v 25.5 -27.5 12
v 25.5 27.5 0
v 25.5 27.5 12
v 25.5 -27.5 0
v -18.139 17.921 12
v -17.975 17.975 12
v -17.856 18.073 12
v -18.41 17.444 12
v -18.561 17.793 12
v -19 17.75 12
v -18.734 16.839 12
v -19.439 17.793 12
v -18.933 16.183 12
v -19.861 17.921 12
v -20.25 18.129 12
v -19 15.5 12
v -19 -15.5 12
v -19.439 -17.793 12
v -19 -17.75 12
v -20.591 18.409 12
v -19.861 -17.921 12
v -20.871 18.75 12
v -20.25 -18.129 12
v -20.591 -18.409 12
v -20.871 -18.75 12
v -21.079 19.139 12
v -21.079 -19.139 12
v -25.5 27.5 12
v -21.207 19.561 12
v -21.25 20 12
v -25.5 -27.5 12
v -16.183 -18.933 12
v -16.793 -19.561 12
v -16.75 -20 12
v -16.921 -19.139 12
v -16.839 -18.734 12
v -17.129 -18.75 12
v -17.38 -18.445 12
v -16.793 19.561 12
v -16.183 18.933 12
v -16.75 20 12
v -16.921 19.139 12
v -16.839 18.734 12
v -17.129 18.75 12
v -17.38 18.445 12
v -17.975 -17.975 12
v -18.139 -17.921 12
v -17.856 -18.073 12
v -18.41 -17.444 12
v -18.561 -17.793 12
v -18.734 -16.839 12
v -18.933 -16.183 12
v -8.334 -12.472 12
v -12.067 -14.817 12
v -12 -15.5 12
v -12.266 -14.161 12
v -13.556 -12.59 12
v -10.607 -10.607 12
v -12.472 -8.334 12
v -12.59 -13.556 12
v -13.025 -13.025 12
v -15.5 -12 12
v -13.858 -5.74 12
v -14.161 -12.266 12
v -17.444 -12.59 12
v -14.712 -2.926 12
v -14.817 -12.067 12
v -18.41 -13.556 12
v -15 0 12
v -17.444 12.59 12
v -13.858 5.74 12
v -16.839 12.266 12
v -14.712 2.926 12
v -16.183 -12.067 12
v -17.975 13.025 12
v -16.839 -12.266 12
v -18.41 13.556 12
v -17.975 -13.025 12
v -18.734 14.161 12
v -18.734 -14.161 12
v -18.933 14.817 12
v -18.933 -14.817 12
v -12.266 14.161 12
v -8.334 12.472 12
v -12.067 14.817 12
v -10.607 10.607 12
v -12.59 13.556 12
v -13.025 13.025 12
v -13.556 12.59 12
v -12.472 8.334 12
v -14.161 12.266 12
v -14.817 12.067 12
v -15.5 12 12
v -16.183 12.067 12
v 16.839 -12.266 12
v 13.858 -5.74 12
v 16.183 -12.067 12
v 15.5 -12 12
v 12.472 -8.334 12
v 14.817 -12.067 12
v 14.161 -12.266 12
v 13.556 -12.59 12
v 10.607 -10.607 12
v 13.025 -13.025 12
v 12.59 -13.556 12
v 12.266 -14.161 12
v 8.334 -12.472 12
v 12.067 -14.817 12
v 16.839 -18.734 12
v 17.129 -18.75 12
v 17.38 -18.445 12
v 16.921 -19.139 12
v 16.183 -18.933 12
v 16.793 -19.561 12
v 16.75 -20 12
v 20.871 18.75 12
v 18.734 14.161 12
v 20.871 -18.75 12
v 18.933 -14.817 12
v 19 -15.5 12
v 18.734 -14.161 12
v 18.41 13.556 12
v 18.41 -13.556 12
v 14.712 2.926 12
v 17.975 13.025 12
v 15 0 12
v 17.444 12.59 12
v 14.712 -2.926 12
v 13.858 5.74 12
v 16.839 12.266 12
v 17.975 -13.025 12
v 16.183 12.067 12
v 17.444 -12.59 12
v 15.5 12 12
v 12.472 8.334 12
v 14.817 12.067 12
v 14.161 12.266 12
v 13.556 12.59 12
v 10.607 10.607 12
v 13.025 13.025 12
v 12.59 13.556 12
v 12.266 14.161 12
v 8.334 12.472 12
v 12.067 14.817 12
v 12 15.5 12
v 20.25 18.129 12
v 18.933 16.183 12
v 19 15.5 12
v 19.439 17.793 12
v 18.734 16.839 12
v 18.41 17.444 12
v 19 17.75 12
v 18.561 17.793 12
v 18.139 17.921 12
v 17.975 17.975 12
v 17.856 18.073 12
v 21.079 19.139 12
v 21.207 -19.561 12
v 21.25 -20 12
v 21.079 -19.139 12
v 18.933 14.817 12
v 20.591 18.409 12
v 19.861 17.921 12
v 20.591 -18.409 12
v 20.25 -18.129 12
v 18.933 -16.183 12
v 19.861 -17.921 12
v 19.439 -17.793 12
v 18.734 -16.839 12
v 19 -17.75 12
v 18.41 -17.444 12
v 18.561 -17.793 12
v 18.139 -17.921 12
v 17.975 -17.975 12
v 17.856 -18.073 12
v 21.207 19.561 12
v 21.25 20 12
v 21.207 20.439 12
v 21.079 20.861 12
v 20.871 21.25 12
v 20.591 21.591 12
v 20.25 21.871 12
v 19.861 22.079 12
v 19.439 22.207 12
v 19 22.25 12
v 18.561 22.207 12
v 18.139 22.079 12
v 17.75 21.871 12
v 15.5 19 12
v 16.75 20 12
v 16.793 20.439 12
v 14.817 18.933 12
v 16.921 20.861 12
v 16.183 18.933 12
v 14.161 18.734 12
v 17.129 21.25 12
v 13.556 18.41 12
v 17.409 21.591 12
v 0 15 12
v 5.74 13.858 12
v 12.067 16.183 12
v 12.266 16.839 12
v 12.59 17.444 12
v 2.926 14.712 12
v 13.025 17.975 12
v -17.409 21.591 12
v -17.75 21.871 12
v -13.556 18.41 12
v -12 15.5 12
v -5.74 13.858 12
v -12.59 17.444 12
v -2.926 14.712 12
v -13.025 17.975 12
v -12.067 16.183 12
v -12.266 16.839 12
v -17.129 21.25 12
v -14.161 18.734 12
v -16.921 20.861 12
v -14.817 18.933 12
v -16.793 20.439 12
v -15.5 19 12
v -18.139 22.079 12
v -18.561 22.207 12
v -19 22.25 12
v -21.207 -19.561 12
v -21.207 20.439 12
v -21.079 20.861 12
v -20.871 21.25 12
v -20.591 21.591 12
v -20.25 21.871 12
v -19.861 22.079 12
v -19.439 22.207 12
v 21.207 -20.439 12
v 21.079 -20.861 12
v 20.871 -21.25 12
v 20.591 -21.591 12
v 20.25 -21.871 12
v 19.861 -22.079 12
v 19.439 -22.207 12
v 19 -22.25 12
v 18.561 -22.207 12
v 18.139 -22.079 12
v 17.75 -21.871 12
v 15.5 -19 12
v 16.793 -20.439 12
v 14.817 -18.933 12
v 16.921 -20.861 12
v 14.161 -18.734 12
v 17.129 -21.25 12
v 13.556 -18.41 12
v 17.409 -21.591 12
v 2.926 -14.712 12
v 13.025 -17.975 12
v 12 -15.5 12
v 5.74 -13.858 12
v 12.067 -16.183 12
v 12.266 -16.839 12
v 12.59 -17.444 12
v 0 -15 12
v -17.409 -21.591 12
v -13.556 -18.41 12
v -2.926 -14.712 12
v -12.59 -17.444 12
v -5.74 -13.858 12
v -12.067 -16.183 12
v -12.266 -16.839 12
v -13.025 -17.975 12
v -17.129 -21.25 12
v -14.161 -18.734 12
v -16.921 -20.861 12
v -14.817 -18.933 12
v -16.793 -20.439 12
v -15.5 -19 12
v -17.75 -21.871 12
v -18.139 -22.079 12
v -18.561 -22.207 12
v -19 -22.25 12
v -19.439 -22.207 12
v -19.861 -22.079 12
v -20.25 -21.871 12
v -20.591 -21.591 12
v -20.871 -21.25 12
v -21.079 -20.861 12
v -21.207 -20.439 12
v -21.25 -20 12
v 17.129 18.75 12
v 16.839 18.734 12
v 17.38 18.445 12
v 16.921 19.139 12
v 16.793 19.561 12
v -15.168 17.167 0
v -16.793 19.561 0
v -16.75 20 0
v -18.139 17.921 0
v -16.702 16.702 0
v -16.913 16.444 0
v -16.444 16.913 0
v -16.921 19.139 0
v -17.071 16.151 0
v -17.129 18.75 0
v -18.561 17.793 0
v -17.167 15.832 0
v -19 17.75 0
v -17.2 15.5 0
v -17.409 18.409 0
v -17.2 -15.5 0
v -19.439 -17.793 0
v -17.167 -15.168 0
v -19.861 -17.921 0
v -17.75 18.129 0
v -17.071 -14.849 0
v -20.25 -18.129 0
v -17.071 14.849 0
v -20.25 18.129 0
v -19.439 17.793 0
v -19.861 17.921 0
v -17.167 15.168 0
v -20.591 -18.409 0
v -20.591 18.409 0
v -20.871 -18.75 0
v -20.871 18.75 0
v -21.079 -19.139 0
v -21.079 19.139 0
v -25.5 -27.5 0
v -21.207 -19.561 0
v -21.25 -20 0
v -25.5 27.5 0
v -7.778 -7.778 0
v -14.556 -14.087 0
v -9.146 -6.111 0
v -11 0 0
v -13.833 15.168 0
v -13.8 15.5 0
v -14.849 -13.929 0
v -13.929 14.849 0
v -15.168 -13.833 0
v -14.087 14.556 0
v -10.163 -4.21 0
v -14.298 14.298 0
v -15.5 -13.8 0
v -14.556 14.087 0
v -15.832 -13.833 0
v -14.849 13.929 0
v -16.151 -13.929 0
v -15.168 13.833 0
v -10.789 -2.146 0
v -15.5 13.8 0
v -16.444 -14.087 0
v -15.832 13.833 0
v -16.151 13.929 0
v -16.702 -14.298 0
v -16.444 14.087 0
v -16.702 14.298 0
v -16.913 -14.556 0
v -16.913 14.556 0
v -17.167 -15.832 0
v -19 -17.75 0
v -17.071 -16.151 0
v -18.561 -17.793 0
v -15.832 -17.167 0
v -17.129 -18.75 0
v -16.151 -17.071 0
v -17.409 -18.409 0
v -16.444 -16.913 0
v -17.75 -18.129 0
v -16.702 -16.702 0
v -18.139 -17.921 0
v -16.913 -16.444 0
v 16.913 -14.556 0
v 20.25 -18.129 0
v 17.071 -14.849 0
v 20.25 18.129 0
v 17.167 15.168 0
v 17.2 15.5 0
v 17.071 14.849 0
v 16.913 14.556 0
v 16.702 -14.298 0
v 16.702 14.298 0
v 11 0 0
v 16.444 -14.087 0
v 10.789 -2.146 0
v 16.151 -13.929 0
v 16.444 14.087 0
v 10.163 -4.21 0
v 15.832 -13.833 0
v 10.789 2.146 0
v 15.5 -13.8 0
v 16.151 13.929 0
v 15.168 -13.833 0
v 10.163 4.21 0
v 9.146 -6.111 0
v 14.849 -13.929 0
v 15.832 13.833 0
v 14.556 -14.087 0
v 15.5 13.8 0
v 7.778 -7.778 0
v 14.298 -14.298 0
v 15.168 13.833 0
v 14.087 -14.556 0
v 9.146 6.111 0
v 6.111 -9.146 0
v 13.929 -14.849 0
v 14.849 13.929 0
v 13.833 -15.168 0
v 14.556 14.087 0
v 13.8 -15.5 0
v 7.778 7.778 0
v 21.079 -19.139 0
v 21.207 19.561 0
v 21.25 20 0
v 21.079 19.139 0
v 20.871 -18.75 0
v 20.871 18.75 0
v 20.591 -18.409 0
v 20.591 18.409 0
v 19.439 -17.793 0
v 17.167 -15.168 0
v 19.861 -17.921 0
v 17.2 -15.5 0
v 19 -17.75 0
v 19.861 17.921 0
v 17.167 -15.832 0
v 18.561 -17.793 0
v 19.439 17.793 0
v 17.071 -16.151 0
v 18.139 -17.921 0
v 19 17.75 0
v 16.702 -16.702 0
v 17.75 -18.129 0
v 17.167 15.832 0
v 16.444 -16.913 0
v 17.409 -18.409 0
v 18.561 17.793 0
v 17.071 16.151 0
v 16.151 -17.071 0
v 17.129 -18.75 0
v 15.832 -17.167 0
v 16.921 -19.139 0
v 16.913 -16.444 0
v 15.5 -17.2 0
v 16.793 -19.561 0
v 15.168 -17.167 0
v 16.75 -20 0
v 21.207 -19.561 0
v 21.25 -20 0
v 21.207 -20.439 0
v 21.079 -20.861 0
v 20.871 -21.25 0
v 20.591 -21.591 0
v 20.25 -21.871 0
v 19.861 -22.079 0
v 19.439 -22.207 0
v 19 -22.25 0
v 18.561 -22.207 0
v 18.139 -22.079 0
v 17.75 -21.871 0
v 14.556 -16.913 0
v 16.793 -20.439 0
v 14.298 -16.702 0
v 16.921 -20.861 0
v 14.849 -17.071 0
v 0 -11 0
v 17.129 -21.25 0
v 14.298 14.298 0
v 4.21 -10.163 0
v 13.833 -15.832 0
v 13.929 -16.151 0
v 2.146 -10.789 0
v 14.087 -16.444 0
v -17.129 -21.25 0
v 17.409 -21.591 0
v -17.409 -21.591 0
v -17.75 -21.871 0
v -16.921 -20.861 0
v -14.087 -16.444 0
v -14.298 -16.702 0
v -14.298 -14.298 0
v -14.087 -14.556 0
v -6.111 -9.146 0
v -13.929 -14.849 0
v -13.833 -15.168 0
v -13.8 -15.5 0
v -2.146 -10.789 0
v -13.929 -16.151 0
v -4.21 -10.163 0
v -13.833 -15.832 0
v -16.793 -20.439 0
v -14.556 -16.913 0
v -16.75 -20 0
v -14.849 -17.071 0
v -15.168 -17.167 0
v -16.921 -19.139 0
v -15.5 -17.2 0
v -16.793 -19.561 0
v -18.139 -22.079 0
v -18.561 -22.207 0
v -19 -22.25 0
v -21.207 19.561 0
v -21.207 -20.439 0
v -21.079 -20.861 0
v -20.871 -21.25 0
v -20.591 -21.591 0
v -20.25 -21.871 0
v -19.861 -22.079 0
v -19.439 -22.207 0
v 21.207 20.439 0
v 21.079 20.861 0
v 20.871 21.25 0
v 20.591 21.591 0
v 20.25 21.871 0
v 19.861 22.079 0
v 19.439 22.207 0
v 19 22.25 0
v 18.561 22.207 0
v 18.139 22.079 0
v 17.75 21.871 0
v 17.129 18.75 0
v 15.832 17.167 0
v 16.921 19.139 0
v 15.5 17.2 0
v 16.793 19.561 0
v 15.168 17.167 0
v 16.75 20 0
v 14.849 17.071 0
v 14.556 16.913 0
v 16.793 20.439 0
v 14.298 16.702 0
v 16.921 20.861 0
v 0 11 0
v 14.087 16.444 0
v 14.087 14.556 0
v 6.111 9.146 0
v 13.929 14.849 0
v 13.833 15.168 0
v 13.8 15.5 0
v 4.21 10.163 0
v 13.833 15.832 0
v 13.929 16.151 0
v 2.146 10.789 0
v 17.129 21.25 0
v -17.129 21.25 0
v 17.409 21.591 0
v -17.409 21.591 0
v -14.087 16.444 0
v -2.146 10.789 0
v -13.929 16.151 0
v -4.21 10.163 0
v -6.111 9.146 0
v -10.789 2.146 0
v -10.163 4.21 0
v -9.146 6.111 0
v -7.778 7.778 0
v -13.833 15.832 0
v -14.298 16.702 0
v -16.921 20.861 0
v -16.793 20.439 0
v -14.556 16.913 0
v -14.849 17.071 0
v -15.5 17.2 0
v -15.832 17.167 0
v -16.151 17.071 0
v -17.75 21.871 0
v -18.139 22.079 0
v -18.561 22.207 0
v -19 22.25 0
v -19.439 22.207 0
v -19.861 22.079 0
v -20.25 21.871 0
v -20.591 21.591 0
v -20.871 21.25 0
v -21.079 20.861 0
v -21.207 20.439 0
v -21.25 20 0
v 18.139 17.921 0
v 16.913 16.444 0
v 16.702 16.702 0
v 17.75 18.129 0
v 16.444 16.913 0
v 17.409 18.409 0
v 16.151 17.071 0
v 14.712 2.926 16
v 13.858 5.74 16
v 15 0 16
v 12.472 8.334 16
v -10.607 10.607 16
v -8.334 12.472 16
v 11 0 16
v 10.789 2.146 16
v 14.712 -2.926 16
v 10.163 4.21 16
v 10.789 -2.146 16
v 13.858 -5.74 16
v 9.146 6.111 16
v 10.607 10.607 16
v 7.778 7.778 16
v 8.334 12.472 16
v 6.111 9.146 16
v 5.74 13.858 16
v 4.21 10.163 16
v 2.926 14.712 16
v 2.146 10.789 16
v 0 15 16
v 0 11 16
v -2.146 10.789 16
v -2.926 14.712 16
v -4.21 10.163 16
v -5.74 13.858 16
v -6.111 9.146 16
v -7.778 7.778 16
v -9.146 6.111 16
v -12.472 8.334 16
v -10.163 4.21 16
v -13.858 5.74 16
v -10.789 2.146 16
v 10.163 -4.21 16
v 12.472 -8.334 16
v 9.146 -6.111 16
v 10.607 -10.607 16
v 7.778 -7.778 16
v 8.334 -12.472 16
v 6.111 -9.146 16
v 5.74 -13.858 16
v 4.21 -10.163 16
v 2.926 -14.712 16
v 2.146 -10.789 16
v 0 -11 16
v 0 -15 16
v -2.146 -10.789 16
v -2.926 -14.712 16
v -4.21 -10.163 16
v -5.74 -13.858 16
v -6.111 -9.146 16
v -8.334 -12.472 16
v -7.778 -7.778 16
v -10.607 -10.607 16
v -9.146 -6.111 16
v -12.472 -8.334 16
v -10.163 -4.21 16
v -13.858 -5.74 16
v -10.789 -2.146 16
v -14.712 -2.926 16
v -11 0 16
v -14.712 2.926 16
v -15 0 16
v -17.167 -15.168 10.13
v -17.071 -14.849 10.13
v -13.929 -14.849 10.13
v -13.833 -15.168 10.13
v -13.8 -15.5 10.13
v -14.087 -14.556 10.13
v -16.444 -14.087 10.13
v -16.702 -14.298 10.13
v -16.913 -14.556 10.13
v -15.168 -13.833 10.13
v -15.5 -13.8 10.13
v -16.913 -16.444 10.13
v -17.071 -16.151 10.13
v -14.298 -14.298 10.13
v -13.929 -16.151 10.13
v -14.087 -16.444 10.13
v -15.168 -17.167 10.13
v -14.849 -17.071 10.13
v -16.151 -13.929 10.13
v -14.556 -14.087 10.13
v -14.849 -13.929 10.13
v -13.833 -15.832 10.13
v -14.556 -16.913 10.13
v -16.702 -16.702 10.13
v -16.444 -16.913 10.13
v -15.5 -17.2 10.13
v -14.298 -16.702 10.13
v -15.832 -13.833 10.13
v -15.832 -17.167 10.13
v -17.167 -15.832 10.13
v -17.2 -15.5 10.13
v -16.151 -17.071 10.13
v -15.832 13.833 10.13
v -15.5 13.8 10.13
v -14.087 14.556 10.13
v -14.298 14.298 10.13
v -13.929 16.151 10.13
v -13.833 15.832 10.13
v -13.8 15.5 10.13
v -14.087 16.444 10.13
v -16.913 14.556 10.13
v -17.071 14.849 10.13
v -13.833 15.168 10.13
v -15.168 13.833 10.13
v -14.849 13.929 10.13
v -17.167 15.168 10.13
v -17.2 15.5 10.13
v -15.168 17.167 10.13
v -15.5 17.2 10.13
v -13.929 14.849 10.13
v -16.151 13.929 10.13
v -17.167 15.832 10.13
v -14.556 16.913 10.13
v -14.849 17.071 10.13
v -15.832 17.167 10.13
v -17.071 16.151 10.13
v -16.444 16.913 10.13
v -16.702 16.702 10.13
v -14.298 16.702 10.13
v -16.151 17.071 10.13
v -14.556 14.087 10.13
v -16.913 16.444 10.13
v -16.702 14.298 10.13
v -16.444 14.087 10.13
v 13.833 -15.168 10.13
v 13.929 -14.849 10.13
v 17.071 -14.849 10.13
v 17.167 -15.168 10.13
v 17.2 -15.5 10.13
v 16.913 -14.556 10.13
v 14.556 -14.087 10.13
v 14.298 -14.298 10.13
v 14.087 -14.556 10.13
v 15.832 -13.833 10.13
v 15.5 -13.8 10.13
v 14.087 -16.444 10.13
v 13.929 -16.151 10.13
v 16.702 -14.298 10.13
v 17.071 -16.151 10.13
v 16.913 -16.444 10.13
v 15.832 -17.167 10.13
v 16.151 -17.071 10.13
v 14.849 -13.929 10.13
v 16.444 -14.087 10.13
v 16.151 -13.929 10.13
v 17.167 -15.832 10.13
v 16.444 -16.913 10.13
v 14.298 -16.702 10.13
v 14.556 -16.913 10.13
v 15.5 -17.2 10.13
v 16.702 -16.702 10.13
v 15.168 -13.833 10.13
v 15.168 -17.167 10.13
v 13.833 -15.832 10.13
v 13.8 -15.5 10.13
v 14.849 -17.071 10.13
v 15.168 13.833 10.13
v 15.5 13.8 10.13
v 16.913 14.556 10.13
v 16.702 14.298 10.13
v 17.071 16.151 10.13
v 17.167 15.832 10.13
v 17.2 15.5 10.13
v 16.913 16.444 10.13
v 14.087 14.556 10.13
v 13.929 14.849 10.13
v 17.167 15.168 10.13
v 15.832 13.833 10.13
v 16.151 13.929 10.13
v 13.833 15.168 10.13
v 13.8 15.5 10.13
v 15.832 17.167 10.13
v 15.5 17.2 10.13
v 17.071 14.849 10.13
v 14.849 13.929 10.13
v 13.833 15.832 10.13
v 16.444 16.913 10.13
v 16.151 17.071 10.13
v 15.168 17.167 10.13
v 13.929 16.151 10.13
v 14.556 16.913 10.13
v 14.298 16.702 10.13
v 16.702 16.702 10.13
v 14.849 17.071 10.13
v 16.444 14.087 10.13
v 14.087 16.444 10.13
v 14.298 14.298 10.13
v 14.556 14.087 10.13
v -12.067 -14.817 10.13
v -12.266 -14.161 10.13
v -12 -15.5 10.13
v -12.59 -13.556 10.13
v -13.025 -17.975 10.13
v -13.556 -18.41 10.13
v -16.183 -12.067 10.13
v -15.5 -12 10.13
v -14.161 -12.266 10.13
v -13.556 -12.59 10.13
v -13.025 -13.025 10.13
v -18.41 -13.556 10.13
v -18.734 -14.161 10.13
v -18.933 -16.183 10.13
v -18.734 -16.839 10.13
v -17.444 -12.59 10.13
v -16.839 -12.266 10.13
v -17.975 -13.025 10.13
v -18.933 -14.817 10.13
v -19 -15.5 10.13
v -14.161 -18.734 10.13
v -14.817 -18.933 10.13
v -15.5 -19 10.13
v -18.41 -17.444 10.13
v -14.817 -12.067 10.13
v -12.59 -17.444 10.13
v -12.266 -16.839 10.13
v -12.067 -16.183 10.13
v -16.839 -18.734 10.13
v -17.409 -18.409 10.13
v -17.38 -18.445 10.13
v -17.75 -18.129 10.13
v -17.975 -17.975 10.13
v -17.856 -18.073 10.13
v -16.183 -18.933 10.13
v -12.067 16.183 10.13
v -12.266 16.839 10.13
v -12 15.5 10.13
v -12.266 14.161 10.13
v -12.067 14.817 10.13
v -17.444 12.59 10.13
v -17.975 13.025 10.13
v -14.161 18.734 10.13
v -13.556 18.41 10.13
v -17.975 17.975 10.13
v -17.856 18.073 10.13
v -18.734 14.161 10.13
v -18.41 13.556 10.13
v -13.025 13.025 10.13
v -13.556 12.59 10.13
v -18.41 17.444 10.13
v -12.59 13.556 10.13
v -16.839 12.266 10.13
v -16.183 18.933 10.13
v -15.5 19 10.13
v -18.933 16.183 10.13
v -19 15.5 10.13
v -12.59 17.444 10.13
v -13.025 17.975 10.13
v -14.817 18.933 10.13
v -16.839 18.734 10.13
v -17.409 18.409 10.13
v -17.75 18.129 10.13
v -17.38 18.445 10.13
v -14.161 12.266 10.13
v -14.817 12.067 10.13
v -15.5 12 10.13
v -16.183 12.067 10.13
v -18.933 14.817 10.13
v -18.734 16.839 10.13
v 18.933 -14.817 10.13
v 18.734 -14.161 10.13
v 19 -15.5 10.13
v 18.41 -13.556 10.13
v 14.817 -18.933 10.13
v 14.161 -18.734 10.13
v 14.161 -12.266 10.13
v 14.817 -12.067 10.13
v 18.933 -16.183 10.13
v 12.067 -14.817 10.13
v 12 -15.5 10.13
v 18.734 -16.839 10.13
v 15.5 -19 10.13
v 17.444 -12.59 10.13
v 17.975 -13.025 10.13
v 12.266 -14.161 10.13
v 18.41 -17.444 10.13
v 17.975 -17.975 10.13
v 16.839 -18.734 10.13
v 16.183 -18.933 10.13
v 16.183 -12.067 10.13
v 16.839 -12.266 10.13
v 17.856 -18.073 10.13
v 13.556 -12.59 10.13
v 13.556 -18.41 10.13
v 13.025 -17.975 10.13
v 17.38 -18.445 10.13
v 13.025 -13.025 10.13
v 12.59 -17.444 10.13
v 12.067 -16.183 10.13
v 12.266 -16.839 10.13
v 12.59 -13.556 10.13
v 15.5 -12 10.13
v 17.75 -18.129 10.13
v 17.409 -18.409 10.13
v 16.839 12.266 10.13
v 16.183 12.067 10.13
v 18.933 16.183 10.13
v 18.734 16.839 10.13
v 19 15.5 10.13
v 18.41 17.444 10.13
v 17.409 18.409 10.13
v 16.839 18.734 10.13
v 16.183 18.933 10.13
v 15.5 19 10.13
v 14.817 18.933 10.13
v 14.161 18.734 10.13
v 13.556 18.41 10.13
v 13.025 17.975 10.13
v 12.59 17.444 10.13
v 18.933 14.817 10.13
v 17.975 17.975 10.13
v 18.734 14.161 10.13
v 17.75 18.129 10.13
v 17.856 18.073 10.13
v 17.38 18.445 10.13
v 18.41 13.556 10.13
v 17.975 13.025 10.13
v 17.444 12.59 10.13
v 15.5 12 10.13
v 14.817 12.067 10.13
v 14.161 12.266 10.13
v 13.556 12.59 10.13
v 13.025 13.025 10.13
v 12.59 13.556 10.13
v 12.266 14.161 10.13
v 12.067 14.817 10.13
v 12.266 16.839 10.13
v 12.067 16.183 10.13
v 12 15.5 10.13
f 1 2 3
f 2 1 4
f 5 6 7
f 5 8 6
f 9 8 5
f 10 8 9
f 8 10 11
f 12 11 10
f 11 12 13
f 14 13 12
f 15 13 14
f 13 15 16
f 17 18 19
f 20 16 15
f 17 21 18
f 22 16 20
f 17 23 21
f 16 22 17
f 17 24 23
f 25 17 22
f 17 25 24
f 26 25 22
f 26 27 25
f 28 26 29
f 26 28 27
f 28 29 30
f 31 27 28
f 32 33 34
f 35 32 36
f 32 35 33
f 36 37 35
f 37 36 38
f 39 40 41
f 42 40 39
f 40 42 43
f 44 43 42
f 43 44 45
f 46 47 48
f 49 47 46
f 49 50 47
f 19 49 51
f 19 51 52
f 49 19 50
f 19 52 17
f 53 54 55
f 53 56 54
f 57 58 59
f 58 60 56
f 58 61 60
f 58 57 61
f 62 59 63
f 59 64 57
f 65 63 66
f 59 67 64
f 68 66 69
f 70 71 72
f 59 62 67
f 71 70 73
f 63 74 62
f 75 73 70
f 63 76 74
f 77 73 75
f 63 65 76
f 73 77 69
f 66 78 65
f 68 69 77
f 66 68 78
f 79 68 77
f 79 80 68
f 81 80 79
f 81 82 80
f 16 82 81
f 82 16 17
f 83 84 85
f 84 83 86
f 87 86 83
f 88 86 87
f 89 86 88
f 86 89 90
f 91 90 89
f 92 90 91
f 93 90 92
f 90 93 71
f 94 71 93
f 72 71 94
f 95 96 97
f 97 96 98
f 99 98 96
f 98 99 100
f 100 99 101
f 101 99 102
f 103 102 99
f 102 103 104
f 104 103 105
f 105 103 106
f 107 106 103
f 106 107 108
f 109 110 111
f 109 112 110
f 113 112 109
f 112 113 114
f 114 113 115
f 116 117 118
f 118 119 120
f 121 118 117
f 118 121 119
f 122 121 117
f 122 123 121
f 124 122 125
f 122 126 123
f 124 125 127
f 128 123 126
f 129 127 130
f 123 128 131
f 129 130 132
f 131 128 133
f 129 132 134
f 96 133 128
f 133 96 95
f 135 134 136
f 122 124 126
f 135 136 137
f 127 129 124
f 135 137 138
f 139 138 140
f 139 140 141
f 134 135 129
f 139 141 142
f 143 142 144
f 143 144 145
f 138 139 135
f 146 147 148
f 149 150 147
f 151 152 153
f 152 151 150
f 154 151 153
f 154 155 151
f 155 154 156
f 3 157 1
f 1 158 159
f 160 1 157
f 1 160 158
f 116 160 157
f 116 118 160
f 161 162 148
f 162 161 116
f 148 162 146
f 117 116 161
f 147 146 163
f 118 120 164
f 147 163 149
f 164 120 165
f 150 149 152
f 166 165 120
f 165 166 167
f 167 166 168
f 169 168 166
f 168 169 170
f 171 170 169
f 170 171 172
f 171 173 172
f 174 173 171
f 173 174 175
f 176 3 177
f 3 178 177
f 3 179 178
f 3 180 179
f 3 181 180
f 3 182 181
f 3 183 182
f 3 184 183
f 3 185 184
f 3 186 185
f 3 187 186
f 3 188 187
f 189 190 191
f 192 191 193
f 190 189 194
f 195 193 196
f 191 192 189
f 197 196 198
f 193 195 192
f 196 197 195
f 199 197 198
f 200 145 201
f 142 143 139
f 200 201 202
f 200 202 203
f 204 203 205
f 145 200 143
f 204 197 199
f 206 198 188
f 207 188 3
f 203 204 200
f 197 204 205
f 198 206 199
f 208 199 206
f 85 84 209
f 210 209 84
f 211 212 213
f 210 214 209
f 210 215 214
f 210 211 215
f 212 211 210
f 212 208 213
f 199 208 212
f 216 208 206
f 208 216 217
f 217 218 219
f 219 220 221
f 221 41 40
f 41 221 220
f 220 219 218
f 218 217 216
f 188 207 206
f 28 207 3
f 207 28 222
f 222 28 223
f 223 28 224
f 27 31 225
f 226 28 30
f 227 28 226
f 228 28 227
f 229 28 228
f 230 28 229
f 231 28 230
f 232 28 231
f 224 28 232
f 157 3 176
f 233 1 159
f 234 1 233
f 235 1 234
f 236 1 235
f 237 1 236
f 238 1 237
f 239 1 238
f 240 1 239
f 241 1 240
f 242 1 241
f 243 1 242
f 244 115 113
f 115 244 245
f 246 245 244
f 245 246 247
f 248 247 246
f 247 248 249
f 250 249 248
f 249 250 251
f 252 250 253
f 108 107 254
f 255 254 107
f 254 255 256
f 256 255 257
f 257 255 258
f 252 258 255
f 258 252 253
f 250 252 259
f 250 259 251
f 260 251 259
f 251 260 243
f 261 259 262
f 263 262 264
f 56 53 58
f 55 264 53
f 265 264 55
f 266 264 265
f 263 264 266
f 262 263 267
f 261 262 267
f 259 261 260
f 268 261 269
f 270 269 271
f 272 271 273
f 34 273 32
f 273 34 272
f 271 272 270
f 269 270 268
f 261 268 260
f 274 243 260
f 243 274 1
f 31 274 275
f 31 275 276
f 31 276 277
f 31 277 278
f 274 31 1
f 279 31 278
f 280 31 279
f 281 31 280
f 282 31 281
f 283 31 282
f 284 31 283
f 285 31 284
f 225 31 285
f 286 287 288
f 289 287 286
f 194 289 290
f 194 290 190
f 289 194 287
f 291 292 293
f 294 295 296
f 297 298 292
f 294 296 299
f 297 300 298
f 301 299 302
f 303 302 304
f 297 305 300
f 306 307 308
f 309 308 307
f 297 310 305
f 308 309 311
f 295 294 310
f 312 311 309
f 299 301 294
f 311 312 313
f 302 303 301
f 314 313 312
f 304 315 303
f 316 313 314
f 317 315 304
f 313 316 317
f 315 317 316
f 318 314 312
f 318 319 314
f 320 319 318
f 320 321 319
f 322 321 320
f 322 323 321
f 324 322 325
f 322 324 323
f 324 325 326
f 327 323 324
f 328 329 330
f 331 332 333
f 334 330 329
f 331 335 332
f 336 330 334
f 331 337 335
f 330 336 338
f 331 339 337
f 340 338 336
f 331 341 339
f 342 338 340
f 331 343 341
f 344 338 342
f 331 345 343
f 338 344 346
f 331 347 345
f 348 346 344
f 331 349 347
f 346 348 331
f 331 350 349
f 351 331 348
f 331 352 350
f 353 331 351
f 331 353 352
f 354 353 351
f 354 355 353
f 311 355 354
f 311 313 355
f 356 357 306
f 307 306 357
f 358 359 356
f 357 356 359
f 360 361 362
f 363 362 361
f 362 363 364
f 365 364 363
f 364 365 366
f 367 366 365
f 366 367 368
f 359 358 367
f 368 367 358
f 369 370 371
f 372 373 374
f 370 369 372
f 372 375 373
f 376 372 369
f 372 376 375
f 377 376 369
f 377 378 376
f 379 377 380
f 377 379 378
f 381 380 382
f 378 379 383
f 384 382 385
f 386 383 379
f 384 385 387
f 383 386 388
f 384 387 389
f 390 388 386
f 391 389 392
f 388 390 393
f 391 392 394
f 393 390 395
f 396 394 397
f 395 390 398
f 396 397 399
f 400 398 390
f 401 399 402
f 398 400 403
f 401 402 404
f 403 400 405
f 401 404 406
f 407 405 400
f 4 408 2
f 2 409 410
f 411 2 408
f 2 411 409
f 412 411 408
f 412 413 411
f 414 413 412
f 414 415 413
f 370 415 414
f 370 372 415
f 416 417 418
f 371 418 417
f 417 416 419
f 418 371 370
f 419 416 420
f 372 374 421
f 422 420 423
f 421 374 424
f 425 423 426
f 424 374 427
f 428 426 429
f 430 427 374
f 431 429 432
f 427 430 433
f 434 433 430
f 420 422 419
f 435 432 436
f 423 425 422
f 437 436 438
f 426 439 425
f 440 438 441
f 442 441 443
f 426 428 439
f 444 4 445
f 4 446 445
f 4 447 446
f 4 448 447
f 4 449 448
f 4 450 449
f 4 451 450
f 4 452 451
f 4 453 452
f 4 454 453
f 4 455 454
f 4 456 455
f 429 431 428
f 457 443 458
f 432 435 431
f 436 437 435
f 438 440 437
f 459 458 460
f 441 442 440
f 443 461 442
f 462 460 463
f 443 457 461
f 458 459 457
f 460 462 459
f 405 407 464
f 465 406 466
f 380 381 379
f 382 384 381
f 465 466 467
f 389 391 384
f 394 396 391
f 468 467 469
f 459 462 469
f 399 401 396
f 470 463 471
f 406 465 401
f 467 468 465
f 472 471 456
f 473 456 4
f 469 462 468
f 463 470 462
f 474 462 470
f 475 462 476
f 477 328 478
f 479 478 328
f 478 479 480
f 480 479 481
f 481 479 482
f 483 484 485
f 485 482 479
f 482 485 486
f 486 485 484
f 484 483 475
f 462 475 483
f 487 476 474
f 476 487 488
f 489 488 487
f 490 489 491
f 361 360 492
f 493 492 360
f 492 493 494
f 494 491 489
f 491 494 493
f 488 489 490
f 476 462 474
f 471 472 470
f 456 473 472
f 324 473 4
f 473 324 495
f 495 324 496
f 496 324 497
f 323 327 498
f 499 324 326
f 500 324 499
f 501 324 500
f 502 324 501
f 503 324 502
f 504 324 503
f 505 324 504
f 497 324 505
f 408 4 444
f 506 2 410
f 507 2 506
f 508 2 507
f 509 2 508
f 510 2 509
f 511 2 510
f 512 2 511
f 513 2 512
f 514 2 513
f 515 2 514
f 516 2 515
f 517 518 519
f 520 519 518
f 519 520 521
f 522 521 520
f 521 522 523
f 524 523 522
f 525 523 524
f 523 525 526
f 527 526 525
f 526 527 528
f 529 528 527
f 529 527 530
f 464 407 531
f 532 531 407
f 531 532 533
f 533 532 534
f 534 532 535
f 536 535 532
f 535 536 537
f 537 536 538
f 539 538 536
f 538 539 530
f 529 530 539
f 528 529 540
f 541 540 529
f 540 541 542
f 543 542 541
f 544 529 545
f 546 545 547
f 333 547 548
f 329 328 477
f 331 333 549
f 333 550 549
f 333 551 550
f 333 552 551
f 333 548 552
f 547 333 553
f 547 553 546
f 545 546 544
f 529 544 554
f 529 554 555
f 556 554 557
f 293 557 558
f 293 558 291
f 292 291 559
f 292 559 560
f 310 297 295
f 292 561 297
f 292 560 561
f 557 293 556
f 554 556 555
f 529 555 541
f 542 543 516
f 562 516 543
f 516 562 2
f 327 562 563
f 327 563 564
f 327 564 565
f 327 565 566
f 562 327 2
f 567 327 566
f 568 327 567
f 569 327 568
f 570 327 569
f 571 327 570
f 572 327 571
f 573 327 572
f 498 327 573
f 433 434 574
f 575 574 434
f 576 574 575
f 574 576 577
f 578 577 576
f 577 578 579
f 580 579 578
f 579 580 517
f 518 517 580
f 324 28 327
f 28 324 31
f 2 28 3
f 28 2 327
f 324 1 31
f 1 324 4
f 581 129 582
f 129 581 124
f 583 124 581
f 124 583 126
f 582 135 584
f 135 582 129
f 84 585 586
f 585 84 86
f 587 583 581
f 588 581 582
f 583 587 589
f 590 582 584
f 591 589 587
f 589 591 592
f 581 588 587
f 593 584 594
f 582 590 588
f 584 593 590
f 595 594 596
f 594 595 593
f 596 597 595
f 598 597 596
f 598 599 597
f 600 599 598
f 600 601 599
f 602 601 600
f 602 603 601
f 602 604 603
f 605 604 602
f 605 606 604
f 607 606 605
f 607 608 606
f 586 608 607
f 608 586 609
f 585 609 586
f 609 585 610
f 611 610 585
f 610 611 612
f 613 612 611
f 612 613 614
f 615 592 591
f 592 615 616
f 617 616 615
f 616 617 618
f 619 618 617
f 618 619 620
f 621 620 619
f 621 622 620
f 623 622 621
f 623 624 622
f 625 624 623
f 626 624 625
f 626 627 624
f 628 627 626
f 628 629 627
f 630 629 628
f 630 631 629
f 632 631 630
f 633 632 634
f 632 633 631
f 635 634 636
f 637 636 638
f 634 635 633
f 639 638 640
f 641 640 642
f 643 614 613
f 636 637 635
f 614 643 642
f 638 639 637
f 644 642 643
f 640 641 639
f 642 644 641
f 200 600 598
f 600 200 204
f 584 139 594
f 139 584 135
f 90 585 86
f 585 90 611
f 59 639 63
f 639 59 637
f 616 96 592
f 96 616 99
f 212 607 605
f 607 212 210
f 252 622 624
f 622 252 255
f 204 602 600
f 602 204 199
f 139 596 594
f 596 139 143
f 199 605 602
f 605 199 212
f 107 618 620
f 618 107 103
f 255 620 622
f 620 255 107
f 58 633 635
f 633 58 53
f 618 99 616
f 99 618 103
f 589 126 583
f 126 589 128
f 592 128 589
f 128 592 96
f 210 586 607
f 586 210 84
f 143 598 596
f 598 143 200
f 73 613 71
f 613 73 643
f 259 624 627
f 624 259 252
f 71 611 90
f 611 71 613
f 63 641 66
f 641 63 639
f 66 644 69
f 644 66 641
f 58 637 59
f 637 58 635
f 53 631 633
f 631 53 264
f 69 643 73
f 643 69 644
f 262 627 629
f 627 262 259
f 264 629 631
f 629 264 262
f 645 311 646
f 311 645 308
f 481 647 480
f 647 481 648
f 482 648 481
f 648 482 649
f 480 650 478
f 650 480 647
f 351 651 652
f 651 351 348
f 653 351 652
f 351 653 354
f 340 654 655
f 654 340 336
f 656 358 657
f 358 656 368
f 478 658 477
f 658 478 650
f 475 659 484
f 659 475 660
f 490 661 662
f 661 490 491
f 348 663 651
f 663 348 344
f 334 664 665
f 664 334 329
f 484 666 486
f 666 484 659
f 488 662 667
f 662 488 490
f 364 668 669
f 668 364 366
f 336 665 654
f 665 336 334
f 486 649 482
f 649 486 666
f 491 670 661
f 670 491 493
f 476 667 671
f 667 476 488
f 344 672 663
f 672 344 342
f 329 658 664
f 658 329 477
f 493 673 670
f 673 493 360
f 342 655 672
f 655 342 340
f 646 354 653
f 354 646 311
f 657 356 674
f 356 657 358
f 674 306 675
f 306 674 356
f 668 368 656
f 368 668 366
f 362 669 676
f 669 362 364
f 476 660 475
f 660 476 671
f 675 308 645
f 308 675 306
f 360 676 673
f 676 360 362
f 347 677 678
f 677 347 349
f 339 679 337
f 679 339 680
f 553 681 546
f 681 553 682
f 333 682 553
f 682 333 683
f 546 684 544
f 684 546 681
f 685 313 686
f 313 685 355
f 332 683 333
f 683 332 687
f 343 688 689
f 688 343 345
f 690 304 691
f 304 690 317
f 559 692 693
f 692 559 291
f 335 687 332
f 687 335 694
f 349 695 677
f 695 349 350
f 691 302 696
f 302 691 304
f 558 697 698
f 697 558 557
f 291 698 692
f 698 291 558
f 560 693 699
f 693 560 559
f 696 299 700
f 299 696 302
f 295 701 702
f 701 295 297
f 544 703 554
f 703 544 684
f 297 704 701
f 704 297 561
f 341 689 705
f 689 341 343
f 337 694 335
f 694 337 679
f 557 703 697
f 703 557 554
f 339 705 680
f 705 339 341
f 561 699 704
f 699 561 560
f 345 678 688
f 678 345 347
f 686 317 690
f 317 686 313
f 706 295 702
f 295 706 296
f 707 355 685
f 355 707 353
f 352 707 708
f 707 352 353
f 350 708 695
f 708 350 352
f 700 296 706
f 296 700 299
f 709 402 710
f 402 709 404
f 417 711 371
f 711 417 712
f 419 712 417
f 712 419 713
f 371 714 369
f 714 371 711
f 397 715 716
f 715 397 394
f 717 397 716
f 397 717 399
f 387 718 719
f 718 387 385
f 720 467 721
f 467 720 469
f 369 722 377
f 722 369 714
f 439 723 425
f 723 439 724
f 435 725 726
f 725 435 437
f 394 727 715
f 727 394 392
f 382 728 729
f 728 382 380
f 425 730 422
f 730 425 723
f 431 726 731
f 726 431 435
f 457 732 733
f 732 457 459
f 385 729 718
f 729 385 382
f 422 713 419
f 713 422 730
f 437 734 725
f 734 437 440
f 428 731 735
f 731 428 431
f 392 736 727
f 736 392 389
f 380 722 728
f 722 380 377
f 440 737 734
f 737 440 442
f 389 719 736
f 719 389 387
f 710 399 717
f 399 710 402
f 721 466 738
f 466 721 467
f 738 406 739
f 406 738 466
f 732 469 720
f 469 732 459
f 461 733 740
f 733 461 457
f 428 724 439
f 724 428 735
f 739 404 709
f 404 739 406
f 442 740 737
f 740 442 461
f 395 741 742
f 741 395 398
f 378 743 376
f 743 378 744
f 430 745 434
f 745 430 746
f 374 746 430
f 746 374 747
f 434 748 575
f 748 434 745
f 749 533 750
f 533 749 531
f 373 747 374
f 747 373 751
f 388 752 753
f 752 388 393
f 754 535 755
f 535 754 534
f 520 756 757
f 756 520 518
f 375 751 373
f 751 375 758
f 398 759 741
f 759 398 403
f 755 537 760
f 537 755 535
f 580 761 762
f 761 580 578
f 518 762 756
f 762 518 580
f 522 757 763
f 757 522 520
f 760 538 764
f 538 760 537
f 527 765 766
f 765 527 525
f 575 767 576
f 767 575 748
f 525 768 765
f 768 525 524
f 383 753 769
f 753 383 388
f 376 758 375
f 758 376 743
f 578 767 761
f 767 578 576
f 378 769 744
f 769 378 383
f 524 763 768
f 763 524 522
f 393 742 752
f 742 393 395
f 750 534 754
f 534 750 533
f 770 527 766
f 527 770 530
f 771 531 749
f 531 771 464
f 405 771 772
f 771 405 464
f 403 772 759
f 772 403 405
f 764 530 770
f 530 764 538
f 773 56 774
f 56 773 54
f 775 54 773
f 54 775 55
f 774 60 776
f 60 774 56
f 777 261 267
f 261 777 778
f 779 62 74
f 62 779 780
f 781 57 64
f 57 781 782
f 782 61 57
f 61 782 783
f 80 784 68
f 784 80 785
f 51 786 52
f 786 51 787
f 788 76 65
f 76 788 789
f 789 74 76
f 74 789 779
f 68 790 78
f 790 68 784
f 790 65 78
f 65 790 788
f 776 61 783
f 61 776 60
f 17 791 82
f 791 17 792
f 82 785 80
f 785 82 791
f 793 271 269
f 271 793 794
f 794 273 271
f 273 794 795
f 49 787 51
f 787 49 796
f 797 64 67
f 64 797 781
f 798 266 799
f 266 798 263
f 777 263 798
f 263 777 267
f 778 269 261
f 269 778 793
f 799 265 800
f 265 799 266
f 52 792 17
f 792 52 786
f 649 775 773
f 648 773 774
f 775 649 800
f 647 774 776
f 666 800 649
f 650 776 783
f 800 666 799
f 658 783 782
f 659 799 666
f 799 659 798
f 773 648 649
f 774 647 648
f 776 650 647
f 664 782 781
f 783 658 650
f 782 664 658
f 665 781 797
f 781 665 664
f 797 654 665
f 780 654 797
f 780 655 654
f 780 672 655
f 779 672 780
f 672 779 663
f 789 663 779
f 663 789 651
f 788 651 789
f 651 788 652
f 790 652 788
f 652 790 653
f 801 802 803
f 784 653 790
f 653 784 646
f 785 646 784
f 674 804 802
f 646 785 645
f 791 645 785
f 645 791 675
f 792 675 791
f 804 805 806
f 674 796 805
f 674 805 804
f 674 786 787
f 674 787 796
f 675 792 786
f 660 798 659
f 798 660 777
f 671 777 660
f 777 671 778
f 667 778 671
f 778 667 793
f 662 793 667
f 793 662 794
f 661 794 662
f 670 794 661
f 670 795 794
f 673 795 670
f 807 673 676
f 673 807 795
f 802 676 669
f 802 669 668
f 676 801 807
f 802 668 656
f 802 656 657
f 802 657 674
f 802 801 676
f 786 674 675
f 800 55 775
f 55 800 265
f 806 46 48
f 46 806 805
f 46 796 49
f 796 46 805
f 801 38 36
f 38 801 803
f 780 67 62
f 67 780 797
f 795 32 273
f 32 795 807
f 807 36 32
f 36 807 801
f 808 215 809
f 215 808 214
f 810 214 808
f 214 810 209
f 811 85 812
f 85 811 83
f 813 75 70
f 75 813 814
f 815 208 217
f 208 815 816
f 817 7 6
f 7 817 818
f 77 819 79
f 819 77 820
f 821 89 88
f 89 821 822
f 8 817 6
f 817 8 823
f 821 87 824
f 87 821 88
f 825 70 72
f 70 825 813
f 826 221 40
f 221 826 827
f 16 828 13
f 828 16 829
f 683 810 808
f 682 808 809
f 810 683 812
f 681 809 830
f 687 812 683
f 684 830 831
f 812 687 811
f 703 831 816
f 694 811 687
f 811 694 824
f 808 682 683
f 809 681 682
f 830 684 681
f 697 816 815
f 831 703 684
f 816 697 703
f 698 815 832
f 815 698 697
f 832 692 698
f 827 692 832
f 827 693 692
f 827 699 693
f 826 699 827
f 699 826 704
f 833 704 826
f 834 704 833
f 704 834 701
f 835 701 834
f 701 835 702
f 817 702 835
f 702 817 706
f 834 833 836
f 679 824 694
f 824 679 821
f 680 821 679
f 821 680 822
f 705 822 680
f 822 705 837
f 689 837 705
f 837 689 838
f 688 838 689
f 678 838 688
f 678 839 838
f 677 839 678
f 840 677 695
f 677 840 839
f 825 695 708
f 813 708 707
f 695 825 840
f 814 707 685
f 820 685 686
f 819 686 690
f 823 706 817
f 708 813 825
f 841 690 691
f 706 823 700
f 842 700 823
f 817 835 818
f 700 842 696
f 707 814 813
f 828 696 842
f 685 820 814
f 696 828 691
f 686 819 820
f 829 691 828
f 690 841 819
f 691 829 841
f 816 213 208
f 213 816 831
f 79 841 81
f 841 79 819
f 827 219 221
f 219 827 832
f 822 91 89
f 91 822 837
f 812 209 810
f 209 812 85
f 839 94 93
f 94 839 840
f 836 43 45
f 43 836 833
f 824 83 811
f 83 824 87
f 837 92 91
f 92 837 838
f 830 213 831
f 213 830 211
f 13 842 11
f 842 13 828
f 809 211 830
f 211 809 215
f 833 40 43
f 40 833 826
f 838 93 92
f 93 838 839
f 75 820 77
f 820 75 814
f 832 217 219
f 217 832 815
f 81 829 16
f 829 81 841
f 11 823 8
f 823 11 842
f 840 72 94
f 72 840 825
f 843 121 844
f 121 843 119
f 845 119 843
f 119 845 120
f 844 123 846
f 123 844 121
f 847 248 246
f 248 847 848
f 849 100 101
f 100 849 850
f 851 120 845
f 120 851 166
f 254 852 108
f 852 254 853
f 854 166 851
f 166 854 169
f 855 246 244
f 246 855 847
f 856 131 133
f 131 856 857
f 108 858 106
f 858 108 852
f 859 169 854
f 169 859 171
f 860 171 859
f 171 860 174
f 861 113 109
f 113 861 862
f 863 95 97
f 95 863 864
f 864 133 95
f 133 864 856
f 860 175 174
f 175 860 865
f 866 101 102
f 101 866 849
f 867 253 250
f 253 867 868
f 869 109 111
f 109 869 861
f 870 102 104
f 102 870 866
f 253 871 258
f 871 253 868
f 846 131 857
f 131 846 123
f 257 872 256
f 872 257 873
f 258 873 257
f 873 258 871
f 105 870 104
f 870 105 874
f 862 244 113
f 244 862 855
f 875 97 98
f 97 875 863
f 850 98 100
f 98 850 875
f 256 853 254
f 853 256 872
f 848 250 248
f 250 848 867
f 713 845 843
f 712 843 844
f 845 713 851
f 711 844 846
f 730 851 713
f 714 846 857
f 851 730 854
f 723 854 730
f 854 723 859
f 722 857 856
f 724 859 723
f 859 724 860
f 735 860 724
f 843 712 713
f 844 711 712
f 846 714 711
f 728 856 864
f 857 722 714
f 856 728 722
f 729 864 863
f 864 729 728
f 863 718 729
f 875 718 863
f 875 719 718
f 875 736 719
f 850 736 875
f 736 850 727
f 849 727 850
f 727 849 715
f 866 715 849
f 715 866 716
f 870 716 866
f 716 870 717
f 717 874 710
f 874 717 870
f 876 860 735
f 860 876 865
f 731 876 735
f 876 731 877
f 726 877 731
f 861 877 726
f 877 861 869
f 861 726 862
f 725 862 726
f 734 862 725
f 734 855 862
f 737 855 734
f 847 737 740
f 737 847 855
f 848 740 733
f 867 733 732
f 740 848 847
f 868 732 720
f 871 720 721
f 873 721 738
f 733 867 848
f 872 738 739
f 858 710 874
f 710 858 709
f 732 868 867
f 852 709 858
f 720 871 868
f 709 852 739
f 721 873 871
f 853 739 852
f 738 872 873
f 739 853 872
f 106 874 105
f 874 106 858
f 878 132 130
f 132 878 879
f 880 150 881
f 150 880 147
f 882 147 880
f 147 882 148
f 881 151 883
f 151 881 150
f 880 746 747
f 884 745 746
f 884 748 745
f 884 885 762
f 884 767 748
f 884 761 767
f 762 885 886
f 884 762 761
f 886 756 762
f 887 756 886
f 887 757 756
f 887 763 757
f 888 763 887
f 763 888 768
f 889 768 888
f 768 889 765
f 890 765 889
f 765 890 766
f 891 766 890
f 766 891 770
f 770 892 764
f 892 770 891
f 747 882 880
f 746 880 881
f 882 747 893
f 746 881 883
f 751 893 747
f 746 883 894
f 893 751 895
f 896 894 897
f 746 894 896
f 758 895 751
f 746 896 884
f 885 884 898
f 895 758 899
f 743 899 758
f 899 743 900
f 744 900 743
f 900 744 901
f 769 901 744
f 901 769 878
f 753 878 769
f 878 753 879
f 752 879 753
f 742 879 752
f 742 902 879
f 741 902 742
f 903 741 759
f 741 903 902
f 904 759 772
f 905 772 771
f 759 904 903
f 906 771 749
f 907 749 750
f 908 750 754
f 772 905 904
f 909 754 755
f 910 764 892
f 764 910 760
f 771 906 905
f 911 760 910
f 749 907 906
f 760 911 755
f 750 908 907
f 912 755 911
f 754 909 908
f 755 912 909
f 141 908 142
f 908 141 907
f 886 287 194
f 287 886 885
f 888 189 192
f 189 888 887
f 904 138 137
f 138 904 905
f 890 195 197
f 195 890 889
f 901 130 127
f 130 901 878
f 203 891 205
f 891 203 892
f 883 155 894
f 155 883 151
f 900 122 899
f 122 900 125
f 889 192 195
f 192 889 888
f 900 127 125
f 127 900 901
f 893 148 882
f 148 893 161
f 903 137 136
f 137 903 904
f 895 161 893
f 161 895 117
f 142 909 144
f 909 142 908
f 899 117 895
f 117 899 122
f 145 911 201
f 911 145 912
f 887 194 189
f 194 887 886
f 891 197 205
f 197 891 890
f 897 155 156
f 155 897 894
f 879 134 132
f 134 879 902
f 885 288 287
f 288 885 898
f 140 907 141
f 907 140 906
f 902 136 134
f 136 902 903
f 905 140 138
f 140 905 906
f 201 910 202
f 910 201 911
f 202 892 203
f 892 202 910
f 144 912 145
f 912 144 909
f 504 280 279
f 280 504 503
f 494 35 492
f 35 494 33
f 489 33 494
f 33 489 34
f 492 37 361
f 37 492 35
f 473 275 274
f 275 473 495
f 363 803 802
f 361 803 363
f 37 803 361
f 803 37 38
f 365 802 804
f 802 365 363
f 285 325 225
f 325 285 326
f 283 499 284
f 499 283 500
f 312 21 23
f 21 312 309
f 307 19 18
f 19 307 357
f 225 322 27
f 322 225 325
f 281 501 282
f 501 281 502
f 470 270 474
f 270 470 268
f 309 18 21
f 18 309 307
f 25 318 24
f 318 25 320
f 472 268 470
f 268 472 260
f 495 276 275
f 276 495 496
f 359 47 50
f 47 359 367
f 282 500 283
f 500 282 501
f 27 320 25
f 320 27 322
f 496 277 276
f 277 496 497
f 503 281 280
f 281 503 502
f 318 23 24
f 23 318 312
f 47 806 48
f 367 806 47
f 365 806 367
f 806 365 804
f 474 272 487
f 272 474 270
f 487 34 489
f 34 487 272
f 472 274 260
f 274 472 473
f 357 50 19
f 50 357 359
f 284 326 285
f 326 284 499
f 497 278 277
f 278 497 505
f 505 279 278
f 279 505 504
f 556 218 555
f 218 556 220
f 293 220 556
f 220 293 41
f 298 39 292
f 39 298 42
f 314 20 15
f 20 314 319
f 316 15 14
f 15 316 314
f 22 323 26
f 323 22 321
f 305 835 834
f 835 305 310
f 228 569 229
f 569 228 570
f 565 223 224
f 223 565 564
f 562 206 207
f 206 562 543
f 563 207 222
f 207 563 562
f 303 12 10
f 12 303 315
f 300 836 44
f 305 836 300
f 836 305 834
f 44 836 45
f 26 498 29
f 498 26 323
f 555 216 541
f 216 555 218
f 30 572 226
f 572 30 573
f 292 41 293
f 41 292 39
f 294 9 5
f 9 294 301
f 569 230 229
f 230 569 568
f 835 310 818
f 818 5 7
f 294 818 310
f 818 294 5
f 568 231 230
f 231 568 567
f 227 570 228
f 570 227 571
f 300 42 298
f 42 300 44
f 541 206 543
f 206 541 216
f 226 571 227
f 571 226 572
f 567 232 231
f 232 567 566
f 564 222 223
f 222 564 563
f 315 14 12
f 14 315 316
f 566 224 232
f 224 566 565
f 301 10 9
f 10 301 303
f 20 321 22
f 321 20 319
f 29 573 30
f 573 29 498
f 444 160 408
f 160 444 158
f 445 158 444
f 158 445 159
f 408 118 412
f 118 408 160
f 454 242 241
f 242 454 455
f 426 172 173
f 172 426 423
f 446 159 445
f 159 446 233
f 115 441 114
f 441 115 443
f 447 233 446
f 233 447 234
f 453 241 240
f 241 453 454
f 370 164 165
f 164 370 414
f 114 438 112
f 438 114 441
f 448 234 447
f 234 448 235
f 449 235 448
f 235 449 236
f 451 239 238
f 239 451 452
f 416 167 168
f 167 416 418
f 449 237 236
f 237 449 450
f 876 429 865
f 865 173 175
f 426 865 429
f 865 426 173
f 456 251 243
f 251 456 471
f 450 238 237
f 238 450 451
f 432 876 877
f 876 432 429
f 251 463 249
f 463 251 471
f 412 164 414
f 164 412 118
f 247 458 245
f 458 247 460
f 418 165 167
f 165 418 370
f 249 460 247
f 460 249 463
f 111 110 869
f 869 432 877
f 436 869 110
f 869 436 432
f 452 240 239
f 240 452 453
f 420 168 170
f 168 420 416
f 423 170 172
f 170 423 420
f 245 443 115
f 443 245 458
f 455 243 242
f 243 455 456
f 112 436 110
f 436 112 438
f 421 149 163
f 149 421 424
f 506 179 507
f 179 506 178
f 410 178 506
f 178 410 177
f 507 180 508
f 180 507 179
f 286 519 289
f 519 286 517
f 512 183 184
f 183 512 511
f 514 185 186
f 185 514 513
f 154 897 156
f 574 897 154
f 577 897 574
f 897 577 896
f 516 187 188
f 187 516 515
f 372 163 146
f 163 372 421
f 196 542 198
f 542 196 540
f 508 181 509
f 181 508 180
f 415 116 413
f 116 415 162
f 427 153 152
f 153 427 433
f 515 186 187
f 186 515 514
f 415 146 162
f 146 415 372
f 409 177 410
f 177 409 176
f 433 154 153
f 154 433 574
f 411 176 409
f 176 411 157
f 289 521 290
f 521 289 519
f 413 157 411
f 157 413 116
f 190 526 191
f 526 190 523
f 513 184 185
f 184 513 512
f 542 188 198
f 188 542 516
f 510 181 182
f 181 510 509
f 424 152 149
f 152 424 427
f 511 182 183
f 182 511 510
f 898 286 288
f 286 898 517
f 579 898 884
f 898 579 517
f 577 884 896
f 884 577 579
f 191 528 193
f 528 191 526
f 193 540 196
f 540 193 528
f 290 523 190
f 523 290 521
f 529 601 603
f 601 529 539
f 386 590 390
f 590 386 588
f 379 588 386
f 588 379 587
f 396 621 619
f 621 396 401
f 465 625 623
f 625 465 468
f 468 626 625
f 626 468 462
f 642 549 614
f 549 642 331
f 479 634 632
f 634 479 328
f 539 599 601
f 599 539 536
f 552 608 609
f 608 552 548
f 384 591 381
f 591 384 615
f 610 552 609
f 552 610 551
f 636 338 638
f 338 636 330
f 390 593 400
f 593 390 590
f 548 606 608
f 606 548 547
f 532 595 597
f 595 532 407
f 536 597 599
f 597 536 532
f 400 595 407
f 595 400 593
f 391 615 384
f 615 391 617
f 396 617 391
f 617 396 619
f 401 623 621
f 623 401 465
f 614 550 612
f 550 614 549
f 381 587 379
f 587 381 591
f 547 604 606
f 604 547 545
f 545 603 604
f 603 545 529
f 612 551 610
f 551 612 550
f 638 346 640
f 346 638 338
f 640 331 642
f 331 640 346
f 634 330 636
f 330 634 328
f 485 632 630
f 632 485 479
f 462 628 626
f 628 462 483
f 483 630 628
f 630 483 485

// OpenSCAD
$fn = 32;

// ----------------------------------------------------------------------
// Motor mount plate: NEMA17, 51 x 55 x 16 mm
// ----------------------------------------------------------------------

// --- parameters (mm) ---
base_x = 51;              // plate length, X
base_y = 55;              // plate width, Y
thick = 12;               // plate thickness
bolt_pitch = 31;          // NEMA17 bolt spacing
motor_d = 3.4;            // NEMA17 screw clearance
boss_hole = 22;           // pilot boss bore
cb_d = 7;                 // counterbore seat
cb_h = 1.87;              // counterbore depth
boss_d = 30;              // raised pilot ring
boss_h = 4;               // raised pilot ring height
second_d = 4.5;           // second fastener hole

module plate() {
  translate([-base_x / 2, -base_y / 2, 0]) cube([base_x, base_y, thick]);
}

module motor_holes() {
  for (sx = [-1, 1]) for (sy = [-1, 1])
    translate([sx * bolt_pitch / 2, sy * bolt_pitch / 2, -1])
      cylinder(h = thick + 2, d = motor_d);
}
module motor_counterbores() {
  for (sx = [-1, 1]) for (sy = [-1, 1])
    translate([sx * bolt_pitch / 2, sy * bolt_pitch / 2, thick - cb_h])
      cylinder(h = cb_h + 0.6, d = cb_d);
}
module pilot_ring() {
  translate([0, 0, thick - 1]) cylinder(h = boss_h + 1, d = boss_d);
}

difference() {
  union() {
    plate();
    pilot_ring();
  }
  motor_holes();
  translate([0, 0, -1]) cylinder(h = thick + boss_h + 2, d = boss_hole);
  motor_counterbores();
  for (sx = [-1, 1]) for (sy = [-1, 1])
    translate([sx * 19, sy * 20, -1]) cylinder(h = thick + 2, d = second_d);
}
